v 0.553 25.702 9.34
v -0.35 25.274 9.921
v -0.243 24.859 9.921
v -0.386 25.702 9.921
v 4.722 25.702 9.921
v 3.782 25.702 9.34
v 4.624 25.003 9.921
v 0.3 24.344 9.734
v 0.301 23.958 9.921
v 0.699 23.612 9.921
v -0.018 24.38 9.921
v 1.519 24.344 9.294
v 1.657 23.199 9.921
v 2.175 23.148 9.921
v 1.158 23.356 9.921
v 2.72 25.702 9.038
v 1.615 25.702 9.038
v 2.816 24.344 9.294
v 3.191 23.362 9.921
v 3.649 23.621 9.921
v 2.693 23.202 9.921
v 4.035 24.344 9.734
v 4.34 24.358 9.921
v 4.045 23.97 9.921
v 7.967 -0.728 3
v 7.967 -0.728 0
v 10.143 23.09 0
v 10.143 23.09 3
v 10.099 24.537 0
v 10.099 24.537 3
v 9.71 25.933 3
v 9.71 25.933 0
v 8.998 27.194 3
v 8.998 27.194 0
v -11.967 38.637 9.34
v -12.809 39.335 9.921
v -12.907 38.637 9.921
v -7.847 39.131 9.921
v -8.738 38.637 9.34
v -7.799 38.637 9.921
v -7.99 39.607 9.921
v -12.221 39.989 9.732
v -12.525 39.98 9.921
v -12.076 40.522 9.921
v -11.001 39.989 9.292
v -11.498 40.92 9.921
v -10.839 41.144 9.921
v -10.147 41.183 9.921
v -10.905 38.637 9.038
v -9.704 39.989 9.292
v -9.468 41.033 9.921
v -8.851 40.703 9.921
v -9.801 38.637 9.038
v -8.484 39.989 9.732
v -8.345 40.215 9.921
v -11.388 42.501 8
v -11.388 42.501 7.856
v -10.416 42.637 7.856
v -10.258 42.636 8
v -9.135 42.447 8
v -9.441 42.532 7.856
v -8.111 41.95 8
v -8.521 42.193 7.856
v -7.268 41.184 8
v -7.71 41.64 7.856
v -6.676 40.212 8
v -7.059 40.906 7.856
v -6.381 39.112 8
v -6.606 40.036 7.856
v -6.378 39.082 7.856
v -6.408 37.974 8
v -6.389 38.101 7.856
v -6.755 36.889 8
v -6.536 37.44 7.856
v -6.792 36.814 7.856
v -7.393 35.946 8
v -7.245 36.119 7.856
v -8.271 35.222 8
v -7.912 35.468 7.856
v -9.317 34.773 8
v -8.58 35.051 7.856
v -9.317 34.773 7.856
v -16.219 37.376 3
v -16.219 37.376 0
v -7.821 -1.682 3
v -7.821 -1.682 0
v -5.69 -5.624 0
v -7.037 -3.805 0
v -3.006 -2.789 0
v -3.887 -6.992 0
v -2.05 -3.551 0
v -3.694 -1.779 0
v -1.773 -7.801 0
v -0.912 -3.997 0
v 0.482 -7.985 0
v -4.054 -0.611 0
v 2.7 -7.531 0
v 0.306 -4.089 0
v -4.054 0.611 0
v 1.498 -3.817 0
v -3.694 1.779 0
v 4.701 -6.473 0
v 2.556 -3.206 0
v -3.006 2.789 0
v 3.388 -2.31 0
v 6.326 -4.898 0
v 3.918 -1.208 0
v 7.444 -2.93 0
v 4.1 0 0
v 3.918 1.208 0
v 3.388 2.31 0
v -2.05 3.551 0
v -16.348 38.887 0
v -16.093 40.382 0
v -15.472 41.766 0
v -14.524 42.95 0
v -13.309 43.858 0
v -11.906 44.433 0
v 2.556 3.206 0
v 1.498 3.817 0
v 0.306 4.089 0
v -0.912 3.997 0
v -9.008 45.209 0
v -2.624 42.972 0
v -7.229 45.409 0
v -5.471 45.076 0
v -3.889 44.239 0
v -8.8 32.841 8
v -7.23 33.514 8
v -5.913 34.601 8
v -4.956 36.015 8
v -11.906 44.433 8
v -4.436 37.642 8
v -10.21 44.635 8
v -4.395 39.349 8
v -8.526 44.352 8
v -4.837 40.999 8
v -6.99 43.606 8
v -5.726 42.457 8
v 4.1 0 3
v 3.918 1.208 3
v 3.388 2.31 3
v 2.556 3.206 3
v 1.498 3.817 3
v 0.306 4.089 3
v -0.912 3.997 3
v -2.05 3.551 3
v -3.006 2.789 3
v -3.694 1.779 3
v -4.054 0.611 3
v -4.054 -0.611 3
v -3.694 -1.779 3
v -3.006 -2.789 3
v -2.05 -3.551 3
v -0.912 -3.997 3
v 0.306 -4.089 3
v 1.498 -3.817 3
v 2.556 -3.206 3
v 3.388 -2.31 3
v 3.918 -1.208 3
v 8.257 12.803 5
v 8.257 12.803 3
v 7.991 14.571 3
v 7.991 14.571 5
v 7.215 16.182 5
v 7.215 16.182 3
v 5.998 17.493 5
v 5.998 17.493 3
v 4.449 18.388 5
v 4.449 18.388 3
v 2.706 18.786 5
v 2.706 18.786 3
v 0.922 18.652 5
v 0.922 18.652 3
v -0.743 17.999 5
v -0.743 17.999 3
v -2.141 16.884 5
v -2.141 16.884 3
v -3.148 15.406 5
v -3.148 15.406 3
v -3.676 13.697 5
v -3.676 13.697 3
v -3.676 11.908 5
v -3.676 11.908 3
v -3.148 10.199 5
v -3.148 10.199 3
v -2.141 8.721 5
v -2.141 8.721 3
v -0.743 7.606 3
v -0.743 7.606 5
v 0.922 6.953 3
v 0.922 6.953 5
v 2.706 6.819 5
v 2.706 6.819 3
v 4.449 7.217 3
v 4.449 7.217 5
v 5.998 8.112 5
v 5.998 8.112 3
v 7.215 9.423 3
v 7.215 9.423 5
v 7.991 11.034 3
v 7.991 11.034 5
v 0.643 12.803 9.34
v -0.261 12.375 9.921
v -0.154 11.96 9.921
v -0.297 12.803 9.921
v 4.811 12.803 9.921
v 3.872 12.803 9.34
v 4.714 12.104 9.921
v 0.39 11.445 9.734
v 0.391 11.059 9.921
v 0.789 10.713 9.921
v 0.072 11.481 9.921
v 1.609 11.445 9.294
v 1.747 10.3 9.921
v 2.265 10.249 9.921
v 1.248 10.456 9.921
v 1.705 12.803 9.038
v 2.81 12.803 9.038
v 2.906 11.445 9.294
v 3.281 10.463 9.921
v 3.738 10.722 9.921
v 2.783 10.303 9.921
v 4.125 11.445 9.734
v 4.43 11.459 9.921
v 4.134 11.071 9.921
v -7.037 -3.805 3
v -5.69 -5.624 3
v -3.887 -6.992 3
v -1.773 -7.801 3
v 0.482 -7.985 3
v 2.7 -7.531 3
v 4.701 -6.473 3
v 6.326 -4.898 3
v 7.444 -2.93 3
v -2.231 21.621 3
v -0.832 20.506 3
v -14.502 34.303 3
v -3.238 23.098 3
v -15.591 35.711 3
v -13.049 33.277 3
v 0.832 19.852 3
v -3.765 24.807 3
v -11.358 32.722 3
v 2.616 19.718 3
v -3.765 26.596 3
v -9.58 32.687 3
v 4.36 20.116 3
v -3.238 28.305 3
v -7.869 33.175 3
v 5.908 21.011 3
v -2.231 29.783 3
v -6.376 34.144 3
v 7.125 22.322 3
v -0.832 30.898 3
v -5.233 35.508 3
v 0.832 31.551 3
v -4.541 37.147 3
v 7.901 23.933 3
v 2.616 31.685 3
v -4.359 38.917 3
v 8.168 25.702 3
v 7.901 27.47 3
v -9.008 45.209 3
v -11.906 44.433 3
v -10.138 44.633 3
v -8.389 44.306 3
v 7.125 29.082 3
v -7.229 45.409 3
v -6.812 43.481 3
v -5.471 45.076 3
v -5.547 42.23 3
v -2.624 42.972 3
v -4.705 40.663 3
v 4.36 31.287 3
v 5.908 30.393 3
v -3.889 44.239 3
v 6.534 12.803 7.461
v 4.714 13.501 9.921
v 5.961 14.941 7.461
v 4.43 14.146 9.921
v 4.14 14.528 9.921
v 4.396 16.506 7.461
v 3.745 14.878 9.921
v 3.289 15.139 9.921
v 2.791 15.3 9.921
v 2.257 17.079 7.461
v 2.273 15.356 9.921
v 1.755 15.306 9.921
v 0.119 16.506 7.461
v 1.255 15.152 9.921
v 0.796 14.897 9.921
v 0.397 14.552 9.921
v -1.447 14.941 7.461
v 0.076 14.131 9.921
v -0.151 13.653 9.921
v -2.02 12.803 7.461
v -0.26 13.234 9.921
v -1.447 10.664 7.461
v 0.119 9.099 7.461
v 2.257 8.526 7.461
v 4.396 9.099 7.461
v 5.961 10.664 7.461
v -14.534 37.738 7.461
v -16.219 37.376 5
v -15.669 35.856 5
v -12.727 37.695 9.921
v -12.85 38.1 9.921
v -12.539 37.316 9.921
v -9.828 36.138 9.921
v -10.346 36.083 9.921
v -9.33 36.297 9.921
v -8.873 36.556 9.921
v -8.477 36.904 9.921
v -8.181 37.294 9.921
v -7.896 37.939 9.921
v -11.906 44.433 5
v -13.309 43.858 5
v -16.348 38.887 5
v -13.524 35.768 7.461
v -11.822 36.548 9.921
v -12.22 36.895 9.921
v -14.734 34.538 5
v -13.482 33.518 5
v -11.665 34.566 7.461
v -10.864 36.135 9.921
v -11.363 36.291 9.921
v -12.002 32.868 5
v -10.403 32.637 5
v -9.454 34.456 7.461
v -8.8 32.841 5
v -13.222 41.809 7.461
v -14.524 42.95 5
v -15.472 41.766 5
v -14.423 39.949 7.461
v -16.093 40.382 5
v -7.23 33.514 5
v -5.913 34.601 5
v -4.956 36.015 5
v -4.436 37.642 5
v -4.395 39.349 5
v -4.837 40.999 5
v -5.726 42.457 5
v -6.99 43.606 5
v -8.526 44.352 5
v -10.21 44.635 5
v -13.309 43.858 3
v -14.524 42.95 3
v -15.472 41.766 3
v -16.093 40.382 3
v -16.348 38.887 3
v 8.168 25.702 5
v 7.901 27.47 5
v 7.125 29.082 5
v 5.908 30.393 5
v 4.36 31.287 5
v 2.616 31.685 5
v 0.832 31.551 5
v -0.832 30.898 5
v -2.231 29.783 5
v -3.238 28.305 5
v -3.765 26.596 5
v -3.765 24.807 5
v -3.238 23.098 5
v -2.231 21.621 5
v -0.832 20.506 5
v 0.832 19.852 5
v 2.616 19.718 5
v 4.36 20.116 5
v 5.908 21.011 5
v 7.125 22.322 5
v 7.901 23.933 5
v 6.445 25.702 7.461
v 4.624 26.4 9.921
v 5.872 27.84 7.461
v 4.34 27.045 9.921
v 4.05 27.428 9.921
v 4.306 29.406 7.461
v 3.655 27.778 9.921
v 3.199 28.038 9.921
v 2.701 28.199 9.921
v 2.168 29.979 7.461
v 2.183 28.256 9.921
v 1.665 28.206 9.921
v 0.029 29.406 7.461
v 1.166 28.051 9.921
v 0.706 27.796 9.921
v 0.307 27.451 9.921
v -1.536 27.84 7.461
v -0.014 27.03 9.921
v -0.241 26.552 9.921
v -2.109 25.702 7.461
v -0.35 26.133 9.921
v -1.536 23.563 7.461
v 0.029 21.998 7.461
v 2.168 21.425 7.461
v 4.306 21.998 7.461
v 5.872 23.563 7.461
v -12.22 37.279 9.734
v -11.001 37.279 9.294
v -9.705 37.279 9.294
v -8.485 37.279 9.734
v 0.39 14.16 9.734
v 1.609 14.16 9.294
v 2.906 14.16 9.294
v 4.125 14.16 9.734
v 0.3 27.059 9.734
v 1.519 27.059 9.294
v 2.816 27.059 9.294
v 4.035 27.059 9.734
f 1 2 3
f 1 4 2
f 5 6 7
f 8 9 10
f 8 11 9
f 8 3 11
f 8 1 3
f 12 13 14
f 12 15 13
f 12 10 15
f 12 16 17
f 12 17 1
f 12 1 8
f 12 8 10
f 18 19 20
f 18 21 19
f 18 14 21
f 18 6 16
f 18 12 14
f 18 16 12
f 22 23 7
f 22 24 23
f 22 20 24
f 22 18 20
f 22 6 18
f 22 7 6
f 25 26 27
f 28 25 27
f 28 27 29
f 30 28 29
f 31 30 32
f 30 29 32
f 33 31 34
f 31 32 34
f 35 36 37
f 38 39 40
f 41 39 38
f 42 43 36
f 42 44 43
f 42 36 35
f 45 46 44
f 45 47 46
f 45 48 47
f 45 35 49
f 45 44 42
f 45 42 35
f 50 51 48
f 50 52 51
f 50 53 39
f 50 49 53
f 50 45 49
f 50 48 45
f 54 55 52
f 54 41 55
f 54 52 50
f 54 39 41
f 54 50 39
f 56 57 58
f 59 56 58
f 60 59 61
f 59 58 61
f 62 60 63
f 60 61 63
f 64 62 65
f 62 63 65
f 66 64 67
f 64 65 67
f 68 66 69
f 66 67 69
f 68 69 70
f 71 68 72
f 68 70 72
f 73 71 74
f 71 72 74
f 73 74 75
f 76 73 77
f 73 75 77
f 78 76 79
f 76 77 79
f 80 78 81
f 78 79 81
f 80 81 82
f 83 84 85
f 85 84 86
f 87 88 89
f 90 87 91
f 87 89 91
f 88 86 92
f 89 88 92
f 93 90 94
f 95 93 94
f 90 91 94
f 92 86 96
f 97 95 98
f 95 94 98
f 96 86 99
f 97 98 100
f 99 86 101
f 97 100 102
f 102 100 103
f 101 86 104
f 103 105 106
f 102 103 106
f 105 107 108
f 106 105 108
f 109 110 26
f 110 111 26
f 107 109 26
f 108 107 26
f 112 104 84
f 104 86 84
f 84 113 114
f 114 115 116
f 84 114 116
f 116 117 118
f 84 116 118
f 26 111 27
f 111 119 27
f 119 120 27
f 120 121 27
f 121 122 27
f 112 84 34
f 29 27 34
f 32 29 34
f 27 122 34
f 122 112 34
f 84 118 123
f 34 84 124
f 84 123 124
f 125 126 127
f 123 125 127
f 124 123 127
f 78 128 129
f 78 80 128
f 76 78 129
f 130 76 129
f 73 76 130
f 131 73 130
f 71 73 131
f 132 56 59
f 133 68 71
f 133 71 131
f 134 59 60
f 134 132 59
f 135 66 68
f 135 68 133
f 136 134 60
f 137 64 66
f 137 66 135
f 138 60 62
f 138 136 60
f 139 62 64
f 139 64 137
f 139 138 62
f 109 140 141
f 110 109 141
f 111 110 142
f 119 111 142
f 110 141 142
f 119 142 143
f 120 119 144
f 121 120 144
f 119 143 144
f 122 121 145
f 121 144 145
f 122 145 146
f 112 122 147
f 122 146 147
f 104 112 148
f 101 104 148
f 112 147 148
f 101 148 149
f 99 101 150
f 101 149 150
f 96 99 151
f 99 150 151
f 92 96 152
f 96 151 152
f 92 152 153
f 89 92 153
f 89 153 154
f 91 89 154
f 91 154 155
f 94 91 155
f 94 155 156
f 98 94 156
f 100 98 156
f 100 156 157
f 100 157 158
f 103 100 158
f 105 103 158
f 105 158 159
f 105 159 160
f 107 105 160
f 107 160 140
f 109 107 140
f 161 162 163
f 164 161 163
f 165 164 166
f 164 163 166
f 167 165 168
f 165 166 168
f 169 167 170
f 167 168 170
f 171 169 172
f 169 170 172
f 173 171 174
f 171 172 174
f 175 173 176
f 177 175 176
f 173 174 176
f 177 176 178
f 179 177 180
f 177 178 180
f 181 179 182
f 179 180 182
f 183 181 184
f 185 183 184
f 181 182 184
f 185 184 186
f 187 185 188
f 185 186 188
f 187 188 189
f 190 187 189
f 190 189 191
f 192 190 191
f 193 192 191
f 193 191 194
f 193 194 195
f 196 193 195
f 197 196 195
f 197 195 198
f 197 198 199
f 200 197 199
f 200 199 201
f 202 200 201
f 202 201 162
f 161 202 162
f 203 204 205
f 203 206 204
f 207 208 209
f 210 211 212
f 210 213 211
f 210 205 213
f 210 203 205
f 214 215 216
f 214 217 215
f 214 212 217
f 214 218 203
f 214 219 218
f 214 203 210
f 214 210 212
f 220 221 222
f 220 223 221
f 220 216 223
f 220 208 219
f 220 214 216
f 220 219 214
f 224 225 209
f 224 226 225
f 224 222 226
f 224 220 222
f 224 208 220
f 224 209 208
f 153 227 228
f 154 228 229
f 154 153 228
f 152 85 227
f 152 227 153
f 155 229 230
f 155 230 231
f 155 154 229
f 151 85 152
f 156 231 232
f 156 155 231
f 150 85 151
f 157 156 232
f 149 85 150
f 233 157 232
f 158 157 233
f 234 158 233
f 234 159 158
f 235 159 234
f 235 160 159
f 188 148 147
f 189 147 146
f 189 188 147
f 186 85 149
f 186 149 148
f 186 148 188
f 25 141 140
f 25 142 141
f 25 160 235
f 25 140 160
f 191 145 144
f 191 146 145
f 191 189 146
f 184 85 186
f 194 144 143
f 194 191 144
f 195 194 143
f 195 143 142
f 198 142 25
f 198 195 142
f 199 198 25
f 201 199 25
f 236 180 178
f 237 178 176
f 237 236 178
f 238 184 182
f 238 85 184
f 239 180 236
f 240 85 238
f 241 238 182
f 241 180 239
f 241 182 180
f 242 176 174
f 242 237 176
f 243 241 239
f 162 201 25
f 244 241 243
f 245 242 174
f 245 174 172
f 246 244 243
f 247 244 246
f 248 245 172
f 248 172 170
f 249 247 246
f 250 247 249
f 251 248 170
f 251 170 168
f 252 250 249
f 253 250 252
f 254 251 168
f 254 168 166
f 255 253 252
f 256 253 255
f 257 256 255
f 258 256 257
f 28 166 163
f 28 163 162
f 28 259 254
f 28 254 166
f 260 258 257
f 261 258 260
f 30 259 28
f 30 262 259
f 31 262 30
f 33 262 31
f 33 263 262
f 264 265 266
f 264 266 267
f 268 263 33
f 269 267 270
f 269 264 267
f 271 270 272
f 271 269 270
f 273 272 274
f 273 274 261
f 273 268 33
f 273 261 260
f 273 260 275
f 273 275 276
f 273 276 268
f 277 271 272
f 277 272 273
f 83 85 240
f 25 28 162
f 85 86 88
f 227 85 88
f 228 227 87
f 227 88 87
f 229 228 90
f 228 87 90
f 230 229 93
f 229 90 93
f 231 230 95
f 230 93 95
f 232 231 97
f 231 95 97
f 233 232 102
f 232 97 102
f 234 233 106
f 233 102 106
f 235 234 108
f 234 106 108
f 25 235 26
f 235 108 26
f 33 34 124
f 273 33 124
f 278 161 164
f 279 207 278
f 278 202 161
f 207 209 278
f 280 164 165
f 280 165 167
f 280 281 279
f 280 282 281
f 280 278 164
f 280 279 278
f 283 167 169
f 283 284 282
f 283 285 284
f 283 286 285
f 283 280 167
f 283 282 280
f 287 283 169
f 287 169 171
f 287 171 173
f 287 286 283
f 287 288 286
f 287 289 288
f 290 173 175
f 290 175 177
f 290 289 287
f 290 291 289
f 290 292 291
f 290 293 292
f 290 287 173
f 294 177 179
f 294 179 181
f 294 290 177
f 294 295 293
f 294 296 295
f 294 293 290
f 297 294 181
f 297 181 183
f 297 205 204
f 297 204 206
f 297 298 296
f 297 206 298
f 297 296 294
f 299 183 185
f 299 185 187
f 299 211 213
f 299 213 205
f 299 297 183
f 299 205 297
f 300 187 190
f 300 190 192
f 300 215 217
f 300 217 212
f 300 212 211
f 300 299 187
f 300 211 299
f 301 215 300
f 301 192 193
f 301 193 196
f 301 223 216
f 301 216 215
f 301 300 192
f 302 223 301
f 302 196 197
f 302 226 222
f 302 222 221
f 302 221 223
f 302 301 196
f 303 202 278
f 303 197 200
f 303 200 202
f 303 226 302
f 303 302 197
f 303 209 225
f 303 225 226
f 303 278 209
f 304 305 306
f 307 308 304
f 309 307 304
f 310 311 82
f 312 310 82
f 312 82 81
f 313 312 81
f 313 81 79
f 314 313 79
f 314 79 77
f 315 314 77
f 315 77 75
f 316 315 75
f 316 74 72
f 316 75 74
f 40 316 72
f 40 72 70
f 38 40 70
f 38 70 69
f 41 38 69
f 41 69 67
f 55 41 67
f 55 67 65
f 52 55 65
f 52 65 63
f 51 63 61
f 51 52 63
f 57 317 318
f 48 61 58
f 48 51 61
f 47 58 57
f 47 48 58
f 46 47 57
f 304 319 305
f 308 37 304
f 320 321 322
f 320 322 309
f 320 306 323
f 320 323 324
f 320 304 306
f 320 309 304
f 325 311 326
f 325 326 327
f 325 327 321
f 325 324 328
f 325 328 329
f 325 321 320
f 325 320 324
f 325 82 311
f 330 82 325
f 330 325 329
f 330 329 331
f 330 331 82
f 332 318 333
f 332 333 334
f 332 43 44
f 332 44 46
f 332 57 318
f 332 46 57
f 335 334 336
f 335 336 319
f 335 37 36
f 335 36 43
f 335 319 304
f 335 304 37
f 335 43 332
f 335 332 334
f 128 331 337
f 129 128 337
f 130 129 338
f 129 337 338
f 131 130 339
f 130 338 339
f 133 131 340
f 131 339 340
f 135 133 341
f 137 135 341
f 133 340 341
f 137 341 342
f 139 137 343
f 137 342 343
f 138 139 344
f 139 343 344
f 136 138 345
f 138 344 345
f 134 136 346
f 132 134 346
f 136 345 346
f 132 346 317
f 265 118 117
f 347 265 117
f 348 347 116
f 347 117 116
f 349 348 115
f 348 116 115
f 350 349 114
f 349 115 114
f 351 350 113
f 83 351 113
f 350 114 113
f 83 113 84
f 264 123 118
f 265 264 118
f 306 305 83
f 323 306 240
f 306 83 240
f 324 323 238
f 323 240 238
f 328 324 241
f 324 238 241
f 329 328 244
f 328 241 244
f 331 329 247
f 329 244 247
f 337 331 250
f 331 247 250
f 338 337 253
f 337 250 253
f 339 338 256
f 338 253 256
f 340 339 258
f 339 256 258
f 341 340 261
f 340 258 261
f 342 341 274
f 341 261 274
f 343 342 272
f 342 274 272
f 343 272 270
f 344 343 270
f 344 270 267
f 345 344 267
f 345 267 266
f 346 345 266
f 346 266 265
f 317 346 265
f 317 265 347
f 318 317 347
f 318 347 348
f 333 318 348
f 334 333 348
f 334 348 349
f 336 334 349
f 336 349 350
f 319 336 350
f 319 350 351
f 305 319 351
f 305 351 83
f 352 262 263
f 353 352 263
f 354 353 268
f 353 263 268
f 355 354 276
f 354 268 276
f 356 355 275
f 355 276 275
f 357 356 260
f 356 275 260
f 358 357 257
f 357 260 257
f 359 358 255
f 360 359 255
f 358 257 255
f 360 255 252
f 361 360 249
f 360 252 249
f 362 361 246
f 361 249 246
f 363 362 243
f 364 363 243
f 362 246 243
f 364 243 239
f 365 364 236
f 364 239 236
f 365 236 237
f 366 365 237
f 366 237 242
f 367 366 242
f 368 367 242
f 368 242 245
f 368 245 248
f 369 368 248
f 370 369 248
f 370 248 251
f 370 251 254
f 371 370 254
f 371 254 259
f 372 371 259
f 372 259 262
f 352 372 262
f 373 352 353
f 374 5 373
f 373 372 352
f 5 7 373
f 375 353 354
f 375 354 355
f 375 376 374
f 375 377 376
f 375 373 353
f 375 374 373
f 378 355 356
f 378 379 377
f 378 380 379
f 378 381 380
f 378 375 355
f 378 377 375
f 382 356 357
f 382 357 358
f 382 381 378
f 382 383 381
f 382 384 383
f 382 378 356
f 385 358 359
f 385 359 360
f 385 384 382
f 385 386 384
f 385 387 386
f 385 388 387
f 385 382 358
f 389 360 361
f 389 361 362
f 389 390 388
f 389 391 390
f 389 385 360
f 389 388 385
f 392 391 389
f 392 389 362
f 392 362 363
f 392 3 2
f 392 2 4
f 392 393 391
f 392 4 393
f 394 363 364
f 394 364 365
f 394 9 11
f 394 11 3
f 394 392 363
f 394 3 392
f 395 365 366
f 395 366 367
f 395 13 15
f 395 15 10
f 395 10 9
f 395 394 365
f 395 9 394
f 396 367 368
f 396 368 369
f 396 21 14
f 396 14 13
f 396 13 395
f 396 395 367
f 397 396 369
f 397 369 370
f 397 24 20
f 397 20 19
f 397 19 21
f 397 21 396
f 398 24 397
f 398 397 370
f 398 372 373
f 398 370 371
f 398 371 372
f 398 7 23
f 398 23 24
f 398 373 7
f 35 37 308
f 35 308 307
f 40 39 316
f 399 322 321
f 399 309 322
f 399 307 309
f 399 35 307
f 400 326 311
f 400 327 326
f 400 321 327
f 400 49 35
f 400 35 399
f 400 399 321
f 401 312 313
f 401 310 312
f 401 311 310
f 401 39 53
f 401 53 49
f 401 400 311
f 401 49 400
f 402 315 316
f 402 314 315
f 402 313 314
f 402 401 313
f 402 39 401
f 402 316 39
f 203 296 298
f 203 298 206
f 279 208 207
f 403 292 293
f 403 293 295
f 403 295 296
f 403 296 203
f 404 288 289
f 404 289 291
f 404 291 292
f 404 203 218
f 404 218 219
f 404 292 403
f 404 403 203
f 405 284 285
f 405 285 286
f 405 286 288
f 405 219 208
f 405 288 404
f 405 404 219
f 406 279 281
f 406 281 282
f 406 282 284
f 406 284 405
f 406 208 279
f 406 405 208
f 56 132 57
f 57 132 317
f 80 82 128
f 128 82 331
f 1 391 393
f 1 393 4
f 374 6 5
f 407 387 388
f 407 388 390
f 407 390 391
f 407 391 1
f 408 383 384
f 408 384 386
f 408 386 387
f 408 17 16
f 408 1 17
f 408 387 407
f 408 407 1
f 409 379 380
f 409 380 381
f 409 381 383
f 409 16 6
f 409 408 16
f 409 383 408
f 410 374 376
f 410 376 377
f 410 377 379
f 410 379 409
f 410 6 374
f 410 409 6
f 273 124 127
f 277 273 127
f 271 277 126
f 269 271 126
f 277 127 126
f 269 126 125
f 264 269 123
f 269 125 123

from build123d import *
from build123d.topology import SkipClean

# Parameters (mm, degrees)
BOSS_EXTRUDE1_DEPTH = 3
SKETCH3_R           = 4.1
CUT_EXTRUDE1_DEPTH  = 50
SKETCH1_3_R         = 6
BOSS_EXTRUDE2_DEPTH = 10
SKETCH1_4_R         = 6
BOSS_EXTRUDE3_DEPTH = 10
SKETCH1_5_R         = 6
BOSS_EXTRUDE8_DEPTH = 10
CHAMFER8_SIZE       = 5
CHAMFER8_SIZE_2     = 3.501037691
BOSS_EXTRUDE7_START = 1.9999999
BOSS_EXTRUDE7_DEPTH = 3.0000001


# Read off the part's stored shape, not the designer's step: Boss-Extrude7
with BuildPart() as part:
    # Sketch1 → Boss-Extrude1 (new body)
    with BuildSketch(Plane.XY):
        with BuildLine():
            ThreePointArc((-7.821268925, -1.68159222), (0.48240993, -7.985441795), (7.966824047, -0.727814955))
            Line((7.966824047, -0.727814955), (10.142674299, 23.089524856))
            ThreePointArc((10.142674299, 23.089524856), (9.947144202, 25.246709523), (8.998392886, 27.19389946))
            Line((8.998392886, 27.19389946), (-2.624147703, 42.972003574))
            ThreePointArc((-2.624147703, 42.972003574), (-5.470725652, 45.075885221), (-9.007898596, 45.209045145))
            Line((-9.007898596, 45.209045145), (-11.905676075, 44.432588009))
            ThreePointArc((-11.905676075, 44.432588009), (-15.472265696, 41.766039268), (-16.218713498, 37.375838886))
            Line((-16.218713498, 37.375838886), (-7.821268925, -1.68159222))
        make_face()
    extrude(amount=BOSS_EXTRUDE1_DEPTH)

    # Sketch3 → Cut-Extrude1 (cut)
    with BuildSketch(Plane.XY.offset(3)):
        Circle(SKETCH3_R)
    extrude(amount=-CUT_EXTRUDE1_DEPTH, mode=Mode.SUBTRACT)

    # Sketch1<3> → Boss-Extrude2 (add)
    with BuildSketch(Plane.XY):
        with Locations(Location((-10.352761804, 38.637033052, 0), (0, 0, 192.134016017))):
            Circle(SKETCH1_3_R)
    extrude(amount=BOSS_EXTRUDE2_DEPTH)

    # Sketch1<4> → Boss-Extrude3 (add)
    with BuildSketch(Plane.XY):
        with Locations((2.167556264, 25.701683368)):
            Circle(SKETCH1_4_R)
    extrude(amount=BOSS_EXTRUDE3_DEPTH)

    # Sketch1<5> → Boss-Extrude8 (add)
    with BuildSketch(Plane.XY):
        with Locations((2.25742631, 12.802500789)):
            Circle(SKETCH1_5_R)
    extrude(amount=BOSS_EXTRUDE8_DEPTH)

    # Sketch6 one side → Cut-Revolve1 (revolve, cut)
    with SkipClean():  # the faces are left unmerged after this step: merging them gives an invalid solid
        with BuildSketch(Plane(origin=(-10.352761804, 0, 0), x_dir=(0, 0, -1), z_dir=(1, 0, 0))):
            with BuildLine():
                ThreePointArc((-13, 34.637033052), (-10.171572875, 35.808605927), (-9, 38.637033052))
                ThreePointArc((-9, 38.637033052), (-10.171572875, 41.465460176), (-13, 42.637033052))
                Line((-13, 42.637033052), (-13, 34.637033052))
            make_face()
        revolve(axis=Axis((-10.352761804, 42.637033052, 13), (0, -1, 0)), mode=Mode.SUBTRACT)

    # Sketch7 one side → Cut-Revolve2 (revolve, cut)
    with SkipClean():  # the faces are left unmerged after this step: merging them gives an invalid solid
        with BuildSketch(Plane(origin=(2.167556264, 0, 0), x_dir=(0, 0, -1), z_dir=(1, 0, 0))):
            with BuildLine():
                ThreePointArc((-13, 21.701683368), (-10.171572875, 22.873256243), (-9, 25.701683368))
                ThreePointArc((-9, 25.701683368), (-10.171572875, 28.530110493), (-13, 29.701683368))
                Line((-13, 29.701683368), (-13, 21.701683368))
            make_face()
        revolve(axis=Axis((2.167556264, 29.701683368, 13), (0, -1, 0)), mode=Mode.SUBTRACT)

    # Sketch16 → Cut-Revolve3 (revolve, cut)
    with SkipClean():  # the faces are left unmerged after this step: merging them gives an invalid solid
        with BuildSketch(Plane(origin=(2.25742631, 0, 0), x_dir=(0, 0, -1), z_dir=(1, 0, 0))):
            with BuildLine():
                ThreePointArc((-9, 12.802500789), (-10.171572875, 15.630927914), (-13, 16.802500789))
                Line((-13, 16.802500789), (-13, 8.802500789))
                ThreePointArc((-13, 8.802500789), (-10.171572875, 9.974073664), (-9, 12.802500789))
            make_face()
            with BuildLine():
                Line((-13, 8.802500789), (-13, 16.802500789))
                ThreePointArc((-13, 16.802500789), (-17, 12.802500789), (-13, 8.802500789))
            make_face()
        revolve(axis=Axis((2.25742631, 16.802500789, 13), (0, -1, 0)), mode=Mode.SUBTRACT)

    # Chamfer8
    # the kernel refuses this chamfer: 5, 3.501037691 mm, written as the material it takes off along each edge
    with BuildSketch(Plane(origin=(-10.352761804, 38.637033052, 10), x_dir=(-0.9776586156884893, -0.21019902751931718, 0), z_dir=(-0.21019902751931718, 0.9776586156884893, 0))) as chamfer8_piece_1:
        Polygon((6, -CHAMFER8_SIZE), (6 - CHAMFER8_SIZE_2, 0), (6, 0), align=None)
    revolve(axis=Axis((-10.352761804, 38.637033052, 10), (0, 0, 1)), mode=Mode.SUBTRACT)
    with BuildSketch(Plane(origin=(2.167556264, 25.701683368, 10), x_dir=(1, 0, 0), z_dir=(0, -1, 0))) as chamfer8_piece_2:
        Polygon((6, -CHAMFER8_SIZE), (6 - CHAMFER8_SIZE_2, 0), (6, 0), align=None)
    revolve(axis=Axis((2.167556264, 25.701683368, 10), (0, 0, 1)), mode=Mode.SUBTRACT)
    with BuildSketch(Plane(origin=(2.25742631, 12.802500789, 10), x_dir=(1, 0, 0), z_dir=(0, -1, 0))) as chamfer8_piece_3:
        Polygon((6, -CHAMFER8_SIZE), (6 - CHAMFER8_SIZE_2, 0), (6, 0), align=None)
    revolve(axis=Axis((2.25742631, 12.802500789, 10), (0, 0, 1)), mode=Mode.SUBTRACT)

    # Boss-Extrude7 outline → Boss-Extrude7 (add)
    with BuildSketch(Plane.XY.offset(3).offset(BOSS_EXTRUDE7_START)):
        with BuildLine():
            ThreePointArc((-8.799847533, 32.841478094), (-4.557206846, 40.189947323), (-11.905676075, 44.43258801))
            Line((-11.905676075, 44.43258801), (-11.388037985, 42.500736357))
            ThreePointArc((-11.388037985, 42.500736357), (-6.489058499, 39.672309232), (-9.317485624, 34.773329746))
            Line((-9.317485624, 34.773329746), (-8.799847533, 32.841478094))
        make_face()
    extrude(amount=BOSS_EXTRUDE7_DEPTH)


solid = part.part
